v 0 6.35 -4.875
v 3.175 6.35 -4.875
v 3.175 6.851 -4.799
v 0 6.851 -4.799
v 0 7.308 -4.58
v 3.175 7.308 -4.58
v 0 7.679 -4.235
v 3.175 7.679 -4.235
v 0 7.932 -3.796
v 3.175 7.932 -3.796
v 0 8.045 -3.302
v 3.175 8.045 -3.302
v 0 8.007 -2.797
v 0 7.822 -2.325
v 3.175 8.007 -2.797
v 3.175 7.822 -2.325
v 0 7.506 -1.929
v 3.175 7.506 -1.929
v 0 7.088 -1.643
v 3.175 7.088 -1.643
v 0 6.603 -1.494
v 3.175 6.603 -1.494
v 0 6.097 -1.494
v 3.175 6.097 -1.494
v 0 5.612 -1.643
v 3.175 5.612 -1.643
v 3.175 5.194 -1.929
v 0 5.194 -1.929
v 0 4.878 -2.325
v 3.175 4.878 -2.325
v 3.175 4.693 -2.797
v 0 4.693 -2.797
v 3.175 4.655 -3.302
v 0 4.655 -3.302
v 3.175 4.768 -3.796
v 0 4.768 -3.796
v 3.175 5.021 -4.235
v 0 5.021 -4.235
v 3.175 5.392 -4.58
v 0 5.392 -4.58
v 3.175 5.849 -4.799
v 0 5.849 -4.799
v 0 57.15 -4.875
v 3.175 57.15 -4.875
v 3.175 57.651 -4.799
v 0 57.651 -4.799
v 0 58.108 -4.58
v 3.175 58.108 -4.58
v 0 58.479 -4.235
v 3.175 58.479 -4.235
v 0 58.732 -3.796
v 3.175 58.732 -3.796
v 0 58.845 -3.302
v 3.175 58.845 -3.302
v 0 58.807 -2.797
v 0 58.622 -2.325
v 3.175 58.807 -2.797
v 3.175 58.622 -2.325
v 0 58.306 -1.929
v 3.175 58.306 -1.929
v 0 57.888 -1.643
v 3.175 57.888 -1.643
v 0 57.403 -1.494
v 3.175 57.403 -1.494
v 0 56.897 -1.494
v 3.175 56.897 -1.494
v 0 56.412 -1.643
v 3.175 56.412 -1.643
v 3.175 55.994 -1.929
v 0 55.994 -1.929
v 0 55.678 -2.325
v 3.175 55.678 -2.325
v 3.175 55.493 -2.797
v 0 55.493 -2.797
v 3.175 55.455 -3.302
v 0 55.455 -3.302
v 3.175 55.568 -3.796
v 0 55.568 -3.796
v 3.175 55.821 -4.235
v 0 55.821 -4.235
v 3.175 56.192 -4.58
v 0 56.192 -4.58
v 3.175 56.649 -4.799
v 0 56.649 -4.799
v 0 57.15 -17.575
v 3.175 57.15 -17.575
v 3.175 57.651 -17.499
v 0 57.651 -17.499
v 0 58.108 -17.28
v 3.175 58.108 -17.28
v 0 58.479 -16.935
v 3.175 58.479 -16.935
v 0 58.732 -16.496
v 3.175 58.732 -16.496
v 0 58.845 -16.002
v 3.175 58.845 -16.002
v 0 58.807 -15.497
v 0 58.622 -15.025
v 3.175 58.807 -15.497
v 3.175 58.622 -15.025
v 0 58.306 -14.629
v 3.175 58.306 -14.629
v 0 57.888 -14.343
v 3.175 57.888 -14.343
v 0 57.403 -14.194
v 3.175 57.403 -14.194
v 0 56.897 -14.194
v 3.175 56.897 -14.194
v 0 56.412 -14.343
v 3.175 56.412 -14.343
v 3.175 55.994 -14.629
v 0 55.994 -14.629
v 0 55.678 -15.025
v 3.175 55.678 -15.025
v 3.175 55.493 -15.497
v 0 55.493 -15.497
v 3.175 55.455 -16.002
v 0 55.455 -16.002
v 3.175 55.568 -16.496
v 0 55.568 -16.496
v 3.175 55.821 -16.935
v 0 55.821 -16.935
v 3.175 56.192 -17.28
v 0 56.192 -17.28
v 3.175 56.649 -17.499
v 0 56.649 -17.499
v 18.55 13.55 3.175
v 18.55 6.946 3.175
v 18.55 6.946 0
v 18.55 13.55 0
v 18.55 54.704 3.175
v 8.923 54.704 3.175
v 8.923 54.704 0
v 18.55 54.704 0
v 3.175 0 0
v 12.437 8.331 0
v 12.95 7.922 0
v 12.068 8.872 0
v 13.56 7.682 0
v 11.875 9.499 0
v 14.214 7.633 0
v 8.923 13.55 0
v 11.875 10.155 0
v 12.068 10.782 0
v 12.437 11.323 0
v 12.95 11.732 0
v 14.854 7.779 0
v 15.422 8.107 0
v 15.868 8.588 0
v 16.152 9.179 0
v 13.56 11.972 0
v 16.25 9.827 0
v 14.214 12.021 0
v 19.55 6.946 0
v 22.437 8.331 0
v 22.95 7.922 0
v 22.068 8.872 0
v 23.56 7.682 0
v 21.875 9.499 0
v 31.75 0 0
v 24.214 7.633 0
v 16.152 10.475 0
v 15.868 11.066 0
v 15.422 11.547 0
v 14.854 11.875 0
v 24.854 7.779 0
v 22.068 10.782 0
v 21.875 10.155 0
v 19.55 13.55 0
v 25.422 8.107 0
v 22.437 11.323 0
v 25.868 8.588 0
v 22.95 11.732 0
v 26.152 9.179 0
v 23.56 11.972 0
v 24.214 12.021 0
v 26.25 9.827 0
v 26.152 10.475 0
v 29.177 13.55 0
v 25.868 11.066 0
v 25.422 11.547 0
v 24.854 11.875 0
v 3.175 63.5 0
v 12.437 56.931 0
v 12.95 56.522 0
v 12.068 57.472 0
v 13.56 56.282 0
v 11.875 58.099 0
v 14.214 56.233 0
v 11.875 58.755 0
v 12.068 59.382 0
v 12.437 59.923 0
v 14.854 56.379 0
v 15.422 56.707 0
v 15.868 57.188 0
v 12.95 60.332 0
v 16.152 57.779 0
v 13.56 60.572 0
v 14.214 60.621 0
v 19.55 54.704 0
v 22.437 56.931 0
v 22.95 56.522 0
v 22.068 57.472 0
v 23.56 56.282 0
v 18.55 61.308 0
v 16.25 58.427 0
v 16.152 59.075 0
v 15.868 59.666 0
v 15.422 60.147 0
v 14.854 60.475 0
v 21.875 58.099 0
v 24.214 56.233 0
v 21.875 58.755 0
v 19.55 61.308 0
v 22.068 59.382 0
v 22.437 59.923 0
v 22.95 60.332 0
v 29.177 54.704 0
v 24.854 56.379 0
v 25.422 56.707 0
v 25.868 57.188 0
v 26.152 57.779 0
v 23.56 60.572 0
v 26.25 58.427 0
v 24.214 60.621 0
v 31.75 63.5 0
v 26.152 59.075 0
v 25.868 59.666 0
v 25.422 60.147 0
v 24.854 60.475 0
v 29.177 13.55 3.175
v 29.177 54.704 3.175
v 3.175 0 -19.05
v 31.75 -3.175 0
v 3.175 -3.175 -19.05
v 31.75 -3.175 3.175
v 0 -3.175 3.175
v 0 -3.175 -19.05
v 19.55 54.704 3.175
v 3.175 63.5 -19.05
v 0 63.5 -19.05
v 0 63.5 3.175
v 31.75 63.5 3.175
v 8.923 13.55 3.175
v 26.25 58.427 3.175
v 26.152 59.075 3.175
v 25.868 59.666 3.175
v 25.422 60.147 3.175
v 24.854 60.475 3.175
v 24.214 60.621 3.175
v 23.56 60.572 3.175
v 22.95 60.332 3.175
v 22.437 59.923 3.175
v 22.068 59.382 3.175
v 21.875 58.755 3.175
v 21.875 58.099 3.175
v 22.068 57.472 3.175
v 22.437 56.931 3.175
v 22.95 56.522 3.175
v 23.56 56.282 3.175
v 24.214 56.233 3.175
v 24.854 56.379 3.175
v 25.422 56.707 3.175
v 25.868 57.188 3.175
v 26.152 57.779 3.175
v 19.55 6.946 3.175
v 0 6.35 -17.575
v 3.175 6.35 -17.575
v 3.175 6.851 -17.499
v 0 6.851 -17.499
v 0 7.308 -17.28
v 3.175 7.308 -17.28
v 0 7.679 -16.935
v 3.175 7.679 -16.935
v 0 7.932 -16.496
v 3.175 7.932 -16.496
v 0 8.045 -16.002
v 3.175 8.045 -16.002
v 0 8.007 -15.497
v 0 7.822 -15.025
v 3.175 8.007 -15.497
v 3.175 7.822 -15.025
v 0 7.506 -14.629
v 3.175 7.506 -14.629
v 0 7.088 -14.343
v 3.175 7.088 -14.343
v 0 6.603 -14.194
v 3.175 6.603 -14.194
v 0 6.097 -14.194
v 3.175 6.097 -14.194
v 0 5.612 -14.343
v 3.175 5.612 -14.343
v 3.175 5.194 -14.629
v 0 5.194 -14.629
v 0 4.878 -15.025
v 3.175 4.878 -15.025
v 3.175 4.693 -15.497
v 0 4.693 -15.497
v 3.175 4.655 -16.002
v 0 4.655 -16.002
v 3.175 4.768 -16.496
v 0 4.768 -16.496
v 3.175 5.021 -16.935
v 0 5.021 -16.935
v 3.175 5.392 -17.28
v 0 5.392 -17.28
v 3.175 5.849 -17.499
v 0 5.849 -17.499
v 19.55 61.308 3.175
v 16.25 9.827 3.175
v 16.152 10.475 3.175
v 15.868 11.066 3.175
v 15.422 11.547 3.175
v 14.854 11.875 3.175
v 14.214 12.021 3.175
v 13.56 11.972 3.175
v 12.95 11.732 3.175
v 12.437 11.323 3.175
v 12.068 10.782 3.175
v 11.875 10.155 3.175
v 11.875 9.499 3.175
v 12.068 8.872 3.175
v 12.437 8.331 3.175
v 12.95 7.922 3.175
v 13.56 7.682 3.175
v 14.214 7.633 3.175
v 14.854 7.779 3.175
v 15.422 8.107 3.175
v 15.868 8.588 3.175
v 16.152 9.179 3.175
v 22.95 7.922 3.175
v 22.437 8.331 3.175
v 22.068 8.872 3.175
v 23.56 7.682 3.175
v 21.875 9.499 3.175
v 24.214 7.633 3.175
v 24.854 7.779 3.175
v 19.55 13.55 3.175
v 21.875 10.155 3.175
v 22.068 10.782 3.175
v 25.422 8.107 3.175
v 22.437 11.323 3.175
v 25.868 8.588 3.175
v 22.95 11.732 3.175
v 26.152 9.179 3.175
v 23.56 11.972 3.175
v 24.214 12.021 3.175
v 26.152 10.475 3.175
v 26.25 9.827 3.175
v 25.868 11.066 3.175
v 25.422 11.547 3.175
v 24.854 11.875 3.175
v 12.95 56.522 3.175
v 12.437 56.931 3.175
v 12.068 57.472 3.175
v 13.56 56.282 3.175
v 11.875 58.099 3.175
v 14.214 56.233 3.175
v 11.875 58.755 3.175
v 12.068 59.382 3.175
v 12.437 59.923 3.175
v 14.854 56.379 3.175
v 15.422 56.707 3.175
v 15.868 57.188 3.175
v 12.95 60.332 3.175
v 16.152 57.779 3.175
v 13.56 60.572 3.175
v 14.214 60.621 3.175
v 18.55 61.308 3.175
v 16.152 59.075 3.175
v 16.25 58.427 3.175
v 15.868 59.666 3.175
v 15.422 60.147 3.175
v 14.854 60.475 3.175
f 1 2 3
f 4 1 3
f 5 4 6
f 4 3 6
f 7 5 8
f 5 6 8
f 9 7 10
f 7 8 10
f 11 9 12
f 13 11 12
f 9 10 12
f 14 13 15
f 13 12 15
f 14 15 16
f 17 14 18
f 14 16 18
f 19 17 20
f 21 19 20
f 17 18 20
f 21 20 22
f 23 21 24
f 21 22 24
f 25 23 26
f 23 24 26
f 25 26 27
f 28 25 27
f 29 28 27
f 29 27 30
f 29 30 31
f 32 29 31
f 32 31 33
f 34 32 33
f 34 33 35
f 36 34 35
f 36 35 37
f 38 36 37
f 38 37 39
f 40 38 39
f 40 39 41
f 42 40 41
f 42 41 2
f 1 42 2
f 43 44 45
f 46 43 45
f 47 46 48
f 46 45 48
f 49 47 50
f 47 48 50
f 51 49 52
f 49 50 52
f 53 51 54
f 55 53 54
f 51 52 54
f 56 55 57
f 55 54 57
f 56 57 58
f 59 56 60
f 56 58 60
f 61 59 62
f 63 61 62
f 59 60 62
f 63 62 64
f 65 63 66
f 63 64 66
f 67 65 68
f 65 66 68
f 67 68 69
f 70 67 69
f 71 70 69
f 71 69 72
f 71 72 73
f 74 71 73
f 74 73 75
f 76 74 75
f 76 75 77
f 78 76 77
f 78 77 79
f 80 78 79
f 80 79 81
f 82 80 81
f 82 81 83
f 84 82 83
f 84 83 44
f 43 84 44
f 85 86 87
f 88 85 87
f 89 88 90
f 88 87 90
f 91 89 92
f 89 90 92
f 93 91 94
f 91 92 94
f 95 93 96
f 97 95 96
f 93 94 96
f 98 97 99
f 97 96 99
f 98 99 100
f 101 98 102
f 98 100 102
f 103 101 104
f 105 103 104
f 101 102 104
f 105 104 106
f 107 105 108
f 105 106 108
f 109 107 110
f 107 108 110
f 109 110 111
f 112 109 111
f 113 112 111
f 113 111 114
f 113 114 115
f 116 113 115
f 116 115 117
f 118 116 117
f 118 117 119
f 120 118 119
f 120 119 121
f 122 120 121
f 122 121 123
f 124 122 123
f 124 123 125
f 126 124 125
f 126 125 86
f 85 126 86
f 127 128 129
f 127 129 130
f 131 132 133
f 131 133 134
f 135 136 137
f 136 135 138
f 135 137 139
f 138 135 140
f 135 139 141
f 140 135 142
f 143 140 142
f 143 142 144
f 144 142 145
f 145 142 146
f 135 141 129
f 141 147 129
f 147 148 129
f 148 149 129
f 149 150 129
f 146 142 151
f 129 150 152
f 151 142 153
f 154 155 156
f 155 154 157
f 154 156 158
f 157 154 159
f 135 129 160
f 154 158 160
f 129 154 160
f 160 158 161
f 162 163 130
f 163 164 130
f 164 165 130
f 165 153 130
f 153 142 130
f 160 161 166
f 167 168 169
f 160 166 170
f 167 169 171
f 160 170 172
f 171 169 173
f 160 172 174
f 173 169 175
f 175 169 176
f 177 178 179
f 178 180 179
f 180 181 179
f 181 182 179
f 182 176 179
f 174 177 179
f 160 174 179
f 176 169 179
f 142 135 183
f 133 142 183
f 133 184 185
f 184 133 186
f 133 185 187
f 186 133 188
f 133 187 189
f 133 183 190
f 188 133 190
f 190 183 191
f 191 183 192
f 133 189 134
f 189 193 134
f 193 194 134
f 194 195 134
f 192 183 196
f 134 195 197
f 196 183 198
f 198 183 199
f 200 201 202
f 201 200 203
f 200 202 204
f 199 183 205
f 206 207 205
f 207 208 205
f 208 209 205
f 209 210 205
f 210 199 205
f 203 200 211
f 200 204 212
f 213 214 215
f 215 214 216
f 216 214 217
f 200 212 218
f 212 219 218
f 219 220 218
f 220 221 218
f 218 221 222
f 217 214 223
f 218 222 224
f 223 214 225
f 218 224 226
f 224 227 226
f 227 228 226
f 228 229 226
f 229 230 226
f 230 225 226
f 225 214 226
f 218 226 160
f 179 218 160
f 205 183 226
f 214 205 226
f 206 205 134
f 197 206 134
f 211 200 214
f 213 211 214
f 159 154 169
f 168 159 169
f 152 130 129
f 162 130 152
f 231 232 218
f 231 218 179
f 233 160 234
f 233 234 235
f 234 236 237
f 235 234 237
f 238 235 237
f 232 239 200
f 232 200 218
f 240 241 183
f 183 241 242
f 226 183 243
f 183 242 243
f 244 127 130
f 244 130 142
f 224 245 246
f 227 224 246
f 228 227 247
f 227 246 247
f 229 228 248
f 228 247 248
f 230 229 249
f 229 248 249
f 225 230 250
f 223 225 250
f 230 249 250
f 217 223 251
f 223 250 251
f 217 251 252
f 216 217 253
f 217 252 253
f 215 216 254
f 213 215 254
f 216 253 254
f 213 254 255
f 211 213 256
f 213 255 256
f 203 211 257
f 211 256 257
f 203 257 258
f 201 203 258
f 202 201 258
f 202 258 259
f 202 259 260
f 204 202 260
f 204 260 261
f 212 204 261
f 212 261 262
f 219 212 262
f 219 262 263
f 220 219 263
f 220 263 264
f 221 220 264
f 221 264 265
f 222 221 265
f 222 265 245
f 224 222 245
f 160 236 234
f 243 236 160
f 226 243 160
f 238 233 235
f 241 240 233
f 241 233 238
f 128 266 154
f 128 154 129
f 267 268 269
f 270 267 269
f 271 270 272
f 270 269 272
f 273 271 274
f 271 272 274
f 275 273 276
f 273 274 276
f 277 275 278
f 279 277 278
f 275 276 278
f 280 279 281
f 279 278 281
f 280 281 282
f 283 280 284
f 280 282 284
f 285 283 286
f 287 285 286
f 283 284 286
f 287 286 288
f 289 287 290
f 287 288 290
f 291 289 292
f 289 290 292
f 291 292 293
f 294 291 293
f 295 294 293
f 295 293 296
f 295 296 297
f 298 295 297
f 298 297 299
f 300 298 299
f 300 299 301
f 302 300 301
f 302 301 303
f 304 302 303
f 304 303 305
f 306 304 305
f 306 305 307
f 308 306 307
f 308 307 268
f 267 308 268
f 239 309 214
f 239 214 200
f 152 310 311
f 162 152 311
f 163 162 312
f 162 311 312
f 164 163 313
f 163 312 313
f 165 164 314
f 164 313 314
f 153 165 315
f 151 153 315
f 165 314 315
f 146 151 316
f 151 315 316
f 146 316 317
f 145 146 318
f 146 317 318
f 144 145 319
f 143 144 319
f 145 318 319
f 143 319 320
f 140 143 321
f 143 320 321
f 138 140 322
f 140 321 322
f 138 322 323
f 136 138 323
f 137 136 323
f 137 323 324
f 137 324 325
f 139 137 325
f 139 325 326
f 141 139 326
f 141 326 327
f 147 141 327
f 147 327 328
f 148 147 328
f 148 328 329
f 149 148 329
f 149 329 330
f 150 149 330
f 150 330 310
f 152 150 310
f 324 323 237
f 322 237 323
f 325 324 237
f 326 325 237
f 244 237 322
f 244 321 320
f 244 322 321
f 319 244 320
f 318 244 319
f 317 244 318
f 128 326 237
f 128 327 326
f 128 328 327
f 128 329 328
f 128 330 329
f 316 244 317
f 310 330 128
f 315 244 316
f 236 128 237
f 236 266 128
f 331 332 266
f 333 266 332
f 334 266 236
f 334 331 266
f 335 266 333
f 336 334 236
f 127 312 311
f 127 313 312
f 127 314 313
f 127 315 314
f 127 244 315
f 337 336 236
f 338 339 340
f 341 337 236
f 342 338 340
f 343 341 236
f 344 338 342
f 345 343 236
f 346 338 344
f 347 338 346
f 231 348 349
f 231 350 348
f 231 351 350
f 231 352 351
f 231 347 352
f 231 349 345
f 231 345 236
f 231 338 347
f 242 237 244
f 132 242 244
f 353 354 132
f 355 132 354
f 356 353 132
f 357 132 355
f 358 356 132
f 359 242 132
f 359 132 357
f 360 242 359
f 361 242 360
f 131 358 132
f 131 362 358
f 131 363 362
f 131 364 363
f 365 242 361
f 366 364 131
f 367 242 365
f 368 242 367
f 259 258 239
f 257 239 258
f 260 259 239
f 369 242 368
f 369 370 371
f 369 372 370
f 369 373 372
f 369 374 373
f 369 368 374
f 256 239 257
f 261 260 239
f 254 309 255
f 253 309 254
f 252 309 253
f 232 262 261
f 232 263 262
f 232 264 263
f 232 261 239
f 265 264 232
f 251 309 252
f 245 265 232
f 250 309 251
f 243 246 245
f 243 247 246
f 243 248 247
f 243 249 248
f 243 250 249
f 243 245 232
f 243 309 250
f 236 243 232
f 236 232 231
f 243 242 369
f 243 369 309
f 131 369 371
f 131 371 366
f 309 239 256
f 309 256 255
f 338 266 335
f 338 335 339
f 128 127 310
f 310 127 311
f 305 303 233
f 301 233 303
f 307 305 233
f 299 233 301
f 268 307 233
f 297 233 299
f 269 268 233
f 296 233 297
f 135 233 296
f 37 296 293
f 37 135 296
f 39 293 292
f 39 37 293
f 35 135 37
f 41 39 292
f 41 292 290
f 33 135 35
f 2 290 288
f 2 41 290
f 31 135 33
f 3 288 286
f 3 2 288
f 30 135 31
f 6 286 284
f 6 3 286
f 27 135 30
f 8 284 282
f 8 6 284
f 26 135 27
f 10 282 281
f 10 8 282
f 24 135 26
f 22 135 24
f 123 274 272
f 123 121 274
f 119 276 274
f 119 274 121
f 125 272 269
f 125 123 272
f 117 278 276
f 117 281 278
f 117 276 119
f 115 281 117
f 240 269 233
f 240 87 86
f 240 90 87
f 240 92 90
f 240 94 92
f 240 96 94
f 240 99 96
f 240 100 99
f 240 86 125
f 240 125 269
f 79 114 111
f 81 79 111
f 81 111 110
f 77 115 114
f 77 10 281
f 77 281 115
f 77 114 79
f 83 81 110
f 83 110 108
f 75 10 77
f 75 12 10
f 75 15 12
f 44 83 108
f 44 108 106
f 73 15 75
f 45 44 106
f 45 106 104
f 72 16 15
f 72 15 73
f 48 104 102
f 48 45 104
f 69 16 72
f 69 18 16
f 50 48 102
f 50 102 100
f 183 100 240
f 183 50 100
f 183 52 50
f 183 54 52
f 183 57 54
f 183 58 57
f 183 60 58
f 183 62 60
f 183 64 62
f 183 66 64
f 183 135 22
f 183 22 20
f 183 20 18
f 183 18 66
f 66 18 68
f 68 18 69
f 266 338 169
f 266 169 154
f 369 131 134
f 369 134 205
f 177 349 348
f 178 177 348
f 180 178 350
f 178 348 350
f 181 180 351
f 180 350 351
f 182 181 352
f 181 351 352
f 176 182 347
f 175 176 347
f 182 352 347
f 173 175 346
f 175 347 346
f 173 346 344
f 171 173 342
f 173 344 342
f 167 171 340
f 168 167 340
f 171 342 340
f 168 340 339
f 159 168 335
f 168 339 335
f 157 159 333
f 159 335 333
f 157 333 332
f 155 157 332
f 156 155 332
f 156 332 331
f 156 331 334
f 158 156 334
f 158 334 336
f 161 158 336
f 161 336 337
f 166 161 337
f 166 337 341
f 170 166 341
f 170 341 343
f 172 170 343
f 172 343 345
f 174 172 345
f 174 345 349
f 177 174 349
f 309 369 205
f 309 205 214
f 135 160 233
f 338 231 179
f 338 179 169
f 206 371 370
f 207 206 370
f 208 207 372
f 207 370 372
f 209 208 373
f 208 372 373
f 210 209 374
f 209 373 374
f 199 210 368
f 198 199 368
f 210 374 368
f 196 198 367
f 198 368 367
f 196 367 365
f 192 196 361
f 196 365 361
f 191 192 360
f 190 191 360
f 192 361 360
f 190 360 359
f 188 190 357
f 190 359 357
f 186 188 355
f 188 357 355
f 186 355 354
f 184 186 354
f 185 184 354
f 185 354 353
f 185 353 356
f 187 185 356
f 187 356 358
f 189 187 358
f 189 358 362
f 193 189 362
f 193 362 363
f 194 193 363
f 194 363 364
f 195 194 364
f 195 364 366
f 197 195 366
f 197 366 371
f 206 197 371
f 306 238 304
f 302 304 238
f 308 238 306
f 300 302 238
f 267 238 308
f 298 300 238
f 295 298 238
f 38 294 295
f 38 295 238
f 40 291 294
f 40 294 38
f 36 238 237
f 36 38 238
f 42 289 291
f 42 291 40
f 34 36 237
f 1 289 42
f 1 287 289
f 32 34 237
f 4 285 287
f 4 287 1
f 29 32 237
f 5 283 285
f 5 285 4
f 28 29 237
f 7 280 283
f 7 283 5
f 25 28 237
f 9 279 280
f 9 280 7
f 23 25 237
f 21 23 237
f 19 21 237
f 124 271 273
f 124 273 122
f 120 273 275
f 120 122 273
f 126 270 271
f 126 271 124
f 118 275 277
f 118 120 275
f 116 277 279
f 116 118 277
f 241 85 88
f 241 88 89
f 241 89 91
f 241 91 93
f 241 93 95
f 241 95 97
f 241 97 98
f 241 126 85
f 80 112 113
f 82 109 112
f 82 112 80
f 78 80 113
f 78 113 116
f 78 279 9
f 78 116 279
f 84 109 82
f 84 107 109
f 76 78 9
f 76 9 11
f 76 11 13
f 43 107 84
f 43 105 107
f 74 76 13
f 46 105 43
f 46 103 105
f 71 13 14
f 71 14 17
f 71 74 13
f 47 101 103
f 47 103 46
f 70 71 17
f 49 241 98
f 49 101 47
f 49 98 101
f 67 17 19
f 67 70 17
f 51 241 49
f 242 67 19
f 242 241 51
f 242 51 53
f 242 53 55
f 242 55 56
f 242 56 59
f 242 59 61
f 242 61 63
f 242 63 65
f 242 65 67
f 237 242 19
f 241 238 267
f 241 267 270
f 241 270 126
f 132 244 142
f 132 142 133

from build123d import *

# Parameters (mm, degrees)
SKETCH2_W           = 31.75
SKETCH2_H           = 63.5
BOSS_EXTRUDE1_DEPTH = 3.175
SKETCH3_R           = 2.200000045
CUT_EXTRUDE1_DEPTH  = 4.175
BOSS_EXTRUDE2_START = -3.175
SKETCH4_W           = 3.175
SKETCH4_H           = 63.5
BOSS_EXTRUDE2_DEPTH = 19.05
BOSS_EXTRUDE3_DEPTH = 3.175
SKETCH6_R           = 1.700000029
CUT_EXTRUDE2_DEPTH  = 4.175


with BuildPart() as part:
    # Sketch2 → Boss-Extrude1 (new body)
    with BuildSketch(Plane.XY):
        with Locations((15.875, 31.75)):
            Rectangle(SKETCH2_W, SKETCH2_H)
    extrude(amount=BOSS_EXTRUDE1_DEPTH)

    # Sketch3 → Cut-Extrude1 (cut, through all)
    with BuildSketch(Plane.XY.offset(3.175)):
        with Locations((14.049999967, 9.827000031)):
            Circle(SKETCH3_R)
        with Locations((24.050000033, 9.827000031)):
            Circle(SKETCH3_R)
        with Locations((14.049999967, 58.427000113)):
            Circle(SKETCH3_R)
        with Locations((24.050000033, 58.427000113)):
            Circle(SKETCH3_R)
        Polygon((8.923000061, 54.704000066), (18.55, 54.704000066), (18.55, 61.308000066), (19.55, 61.308000066), (19.55, 54.704000066), (29.176999939, 54.704000066), (29.176999939, 13.550000078), (19.55, 13.550000078), (19.55, 6.946000078), (18.55, 6.946000078), (18.55, 13.550000078), (8.923000061, 13.550000078), align=None)
    extrude(amount=-CUT_EXTRUDE1_DEPTH, mode=Mode.SUBTRACT)

    # Sketch4 → Boss-Extrude2 (add)
    with BuildSketch(Plane.XY.offset(3.175).offset(BOSS_EXTRUDE2_START)):
        with Locations((1.5875, 31.75)):
            Rectangle(SKETCH4_W, SKETCH4_H)
    extrude(amount=-BOSS_EXTRUDE2_DEPTH)

    # Sketch5 → Boss-Extrude3 (add)
    with BuildSketch(Plane.XZ):
        Polygon((0, 3.175), (31.75, 3.175), (31.75, 0), (3.175, -19.05), (0, -19.05), align=None)
    extrude(amount=BOSS_EXTRUDE3_DEPTH)

    # Sketch6 → Cut-Extrude2 (cut, through all)
    with BuildSketch(Plane(origin=(3.175, 0, 0), x_dir=(0, 0, -1), z_dir=(1, 0, 0))):
        with Locations((3.175, 57.15)):
            Circle(SKETCH6_R)
        with Locations((3.175, 6.35)):
            Circle(SKETCH6_R)
        with Locations((15.875, 57.15)):
            Circle(SKETCH6_R)
        with Locations((15.875, 6.35)):
            Circle(SKETCH6_R)
    extrude(amount=-CUT_EXTRUDE2_DEPTH, mode=Mode.SUBTRACT)


solid = part.part
